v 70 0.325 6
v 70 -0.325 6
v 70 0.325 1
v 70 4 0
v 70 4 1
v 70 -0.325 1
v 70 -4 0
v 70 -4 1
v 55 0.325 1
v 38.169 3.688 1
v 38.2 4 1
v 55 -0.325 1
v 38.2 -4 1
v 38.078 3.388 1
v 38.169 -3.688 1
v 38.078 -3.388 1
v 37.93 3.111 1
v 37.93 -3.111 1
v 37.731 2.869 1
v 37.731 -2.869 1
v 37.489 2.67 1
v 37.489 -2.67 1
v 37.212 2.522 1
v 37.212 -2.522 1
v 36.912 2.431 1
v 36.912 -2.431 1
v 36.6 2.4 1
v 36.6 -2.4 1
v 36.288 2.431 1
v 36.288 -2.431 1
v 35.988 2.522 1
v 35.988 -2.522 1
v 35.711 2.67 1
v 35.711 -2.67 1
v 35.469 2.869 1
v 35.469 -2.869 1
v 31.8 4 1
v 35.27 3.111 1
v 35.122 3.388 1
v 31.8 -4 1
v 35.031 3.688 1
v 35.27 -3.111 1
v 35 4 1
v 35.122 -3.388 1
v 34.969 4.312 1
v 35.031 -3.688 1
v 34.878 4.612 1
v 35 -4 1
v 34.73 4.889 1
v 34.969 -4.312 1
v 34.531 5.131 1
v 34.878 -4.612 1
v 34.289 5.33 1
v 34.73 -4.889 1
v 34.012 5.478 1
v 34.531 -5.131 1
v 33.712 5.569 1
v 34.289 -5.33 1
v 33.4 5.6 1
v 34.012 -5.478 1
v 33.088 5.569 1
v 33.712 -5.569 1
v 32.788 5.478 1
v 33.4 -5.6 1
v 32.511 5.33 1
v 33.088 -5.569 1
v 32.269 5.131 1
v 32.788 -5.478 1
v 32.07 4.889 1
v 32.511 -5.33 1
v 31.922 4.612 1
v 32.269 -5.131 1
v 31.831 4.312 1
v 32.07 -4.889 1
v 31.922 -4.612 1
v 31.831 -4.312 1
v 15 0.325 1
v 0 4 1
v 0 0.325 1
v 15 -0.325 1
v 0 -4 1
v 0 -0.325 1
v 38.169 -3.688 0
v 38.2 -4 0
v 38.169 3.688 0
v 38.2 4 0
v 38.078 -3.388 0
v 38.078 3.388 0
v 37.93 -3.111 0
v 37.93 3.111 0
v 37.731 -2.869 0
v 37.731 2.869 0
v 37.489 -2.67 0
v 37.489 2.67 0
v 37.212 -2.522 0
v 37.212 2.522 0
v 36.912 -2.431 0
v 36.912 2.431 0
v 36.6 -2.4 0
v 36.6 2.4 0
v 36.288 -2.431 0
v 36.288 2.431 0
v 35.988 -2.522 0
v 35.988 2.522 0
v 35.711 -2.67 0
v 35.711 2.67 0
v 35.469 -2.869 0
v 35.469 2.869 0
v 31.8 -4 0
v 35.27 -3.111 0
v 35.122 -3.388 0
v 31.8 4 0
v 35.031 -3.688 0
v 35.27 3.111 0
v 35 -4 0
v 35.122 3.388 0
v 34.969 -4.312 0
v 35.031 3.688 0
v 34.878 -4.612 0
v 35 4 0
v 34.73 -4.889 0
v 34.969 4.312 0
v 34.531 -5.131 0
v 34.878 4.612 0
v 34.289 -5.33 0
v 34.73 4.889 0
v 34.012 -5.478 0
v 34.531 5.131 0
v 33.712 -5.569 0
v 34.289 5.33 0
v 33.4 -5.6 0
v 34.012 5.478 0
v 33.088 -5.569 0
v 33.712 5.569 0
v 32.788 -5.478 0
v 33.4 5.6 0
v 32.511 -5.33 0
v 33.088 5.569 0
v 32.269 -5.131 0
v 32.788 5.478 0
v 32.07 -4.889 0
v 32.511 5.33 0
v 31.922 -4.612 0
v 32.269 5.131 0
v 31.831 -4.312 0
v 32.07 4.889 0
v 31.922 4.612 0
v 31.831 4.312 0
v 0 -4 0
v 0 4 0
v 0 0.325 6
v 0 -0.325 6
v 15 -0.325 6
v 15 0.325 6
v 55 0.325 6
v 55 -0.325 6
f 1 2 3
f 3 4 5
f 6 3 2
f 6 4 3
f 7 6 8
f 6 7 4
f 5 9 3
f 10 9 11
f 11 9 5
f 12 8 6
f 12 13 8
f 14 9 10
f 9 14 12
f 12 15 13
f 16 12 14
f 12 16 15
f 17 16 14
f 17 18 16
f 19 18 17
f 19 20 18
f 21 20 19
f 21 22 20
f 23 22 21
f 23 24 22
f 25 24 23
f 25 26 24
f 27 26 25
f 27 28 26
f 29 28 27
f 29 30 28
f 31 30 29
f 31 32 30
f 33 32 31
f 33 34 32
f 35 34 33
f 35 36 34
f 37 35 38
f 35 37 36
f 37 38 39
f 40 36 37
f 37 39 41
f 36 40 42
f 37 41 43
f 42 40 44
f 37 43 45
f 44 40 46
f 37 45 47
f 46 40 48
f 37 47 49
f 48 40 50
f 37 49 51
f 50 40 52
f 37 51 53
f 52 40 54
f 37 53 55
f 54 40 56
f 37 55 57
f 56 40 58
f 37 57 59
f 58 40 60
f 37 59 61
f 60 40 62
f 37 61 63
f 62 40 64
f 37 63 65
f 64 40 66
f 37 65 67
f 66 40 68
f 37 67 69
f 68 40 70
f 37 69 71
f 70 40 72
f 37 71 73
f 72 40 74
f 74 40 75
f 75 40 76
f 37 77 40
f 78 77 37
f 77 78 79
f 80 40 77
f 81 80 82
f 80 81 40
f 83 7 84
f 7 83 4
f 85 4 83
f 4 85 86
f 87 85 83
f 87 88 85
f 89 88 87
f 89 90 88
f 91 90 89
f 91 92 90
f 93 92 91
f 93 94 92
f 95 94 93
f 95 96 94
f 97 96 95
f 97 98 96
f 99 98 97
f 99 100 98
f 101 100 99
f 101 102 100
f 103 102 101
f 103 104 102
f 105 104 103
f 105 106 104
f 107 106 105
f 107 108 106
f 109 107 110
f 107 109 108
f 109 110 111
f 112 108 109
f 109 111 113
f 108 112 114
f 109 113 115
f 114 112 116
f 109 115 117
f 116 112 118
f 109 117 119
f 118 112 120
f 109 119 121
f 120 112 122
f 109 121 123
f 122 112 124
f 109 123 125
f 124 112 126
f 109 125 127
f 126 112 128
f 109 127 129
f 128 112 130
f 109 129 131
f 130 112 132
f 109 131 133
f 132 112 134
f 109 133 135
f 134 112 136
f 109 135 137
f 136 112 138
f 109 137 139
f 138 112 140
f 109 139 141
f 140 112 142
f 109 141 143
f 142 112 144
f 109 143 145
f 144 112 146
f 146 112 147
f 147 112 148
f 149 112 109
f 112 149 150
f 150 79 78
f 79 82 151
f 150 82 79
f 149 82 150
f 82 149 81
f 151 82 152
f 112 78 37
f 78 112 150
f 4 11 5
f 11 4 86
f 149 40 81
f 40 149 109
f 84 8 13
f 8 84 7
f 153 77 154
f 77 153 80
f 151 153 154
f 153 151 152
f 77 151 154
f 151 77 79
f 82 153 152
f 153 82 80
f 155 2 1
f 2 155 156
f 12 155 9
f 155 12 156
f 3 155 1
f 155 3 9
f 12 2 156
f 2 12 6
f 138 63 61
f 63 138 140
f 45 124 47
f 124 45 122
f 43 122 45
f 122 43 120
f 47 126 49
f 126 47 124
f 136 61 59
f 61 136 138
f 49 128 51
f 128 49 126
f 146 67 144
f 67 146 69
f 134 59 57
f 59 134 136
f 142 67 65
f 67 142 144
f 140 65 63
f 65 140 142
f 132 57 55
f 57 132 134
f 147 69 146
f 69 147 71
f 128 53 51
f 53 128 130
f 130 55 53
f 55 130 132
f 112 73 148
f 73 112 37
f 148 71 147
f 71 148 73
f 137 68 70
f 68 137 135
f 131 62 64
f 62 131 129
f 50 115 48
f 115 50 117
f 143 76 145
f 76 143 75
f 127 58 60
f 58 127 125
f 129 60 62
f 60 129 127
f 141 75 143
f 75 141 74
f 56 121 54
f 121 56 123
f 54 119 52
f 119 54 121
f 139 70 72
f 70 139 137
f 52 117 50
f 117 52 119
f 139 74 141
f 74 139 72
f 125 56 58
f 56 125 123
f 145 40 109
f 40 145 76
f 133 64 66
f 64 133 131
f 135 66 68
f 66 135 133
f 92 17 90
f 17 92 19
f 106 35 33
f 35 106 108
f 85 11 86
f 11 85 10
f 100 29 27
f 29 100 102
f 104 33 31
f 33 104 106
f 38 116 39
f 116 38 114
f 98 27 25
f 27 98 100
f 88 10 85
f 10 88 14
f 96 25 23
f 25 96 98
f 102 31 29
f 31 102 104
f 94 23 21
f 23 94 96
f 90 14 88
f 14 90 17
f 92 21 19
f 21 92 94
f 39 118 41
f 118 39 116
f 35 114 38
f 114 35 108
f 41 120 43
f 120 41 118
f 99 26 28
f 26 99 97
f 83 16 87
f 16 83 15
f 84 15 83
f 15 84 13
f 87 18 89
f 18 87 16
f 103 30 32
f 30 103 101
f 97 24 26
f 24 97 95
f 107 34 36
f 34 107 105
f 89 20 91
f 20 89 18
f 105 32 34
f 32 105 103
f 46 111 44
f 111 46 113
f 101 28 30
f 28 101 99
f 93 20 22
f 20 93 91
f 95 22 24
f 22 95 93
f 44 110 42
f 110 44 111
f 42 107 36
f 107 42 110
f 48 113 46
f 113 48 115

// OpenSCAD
/*
Deterministic Retraction Calibration
Written by David Orgeman - 2015
Released under the Creative Commons Attribution-ShareAlike license
CC BY-SA

This creates a calibration object with a vertical fin that has a gap
of a specified size.  The object is designed so that most slicers will
cause retract to occur on one side of the gap, the printhead to then
travel directly to the other side of the gap, and reload to then occur.
This allows careful examination and tuning of the retraction parameters
to improve print quality.  Because the object is easy to print and does
not depend on other challenging capabilities, this allows tuning even
on a printer that is still a long ways from printing cleanly.  It is
adjustable if the default parameters do not work for some specific
printer.  The base of the object has on indent indicating the side of
the gap where retract took place, and a bump indicating the side where
reload happened.  Those markers can be flipped if the slicer in use
causes a different path from what I have generally seen.
*/



//PARAMETERS

//gap over which the retract will travel
WallGap=40;

//single extrusion width wall thickness
WallWidth=0.65;

//height of the calibration object
WallHeight=6;

//length of the wall on each side of the gap
WallLength=15;

//width of the calibration object
BaseWidth=8;

//print retract and reload normal(1) or inverted(-1)
Flipper=1;//[1,-1]



Retraction();



module Retraction() {
	difference() {
		union() {
			translate([0,-BaseWidth/2,0])
				cube([2*WallLength+WallGap,BaseWidth,1]);
			translate([0,-WallWidth/2,0])
				cube([WallLength,WallWidth,WallHeight]);
			translate([WallLength+WallGap,-WallWidth/2,0])	
				cube([WallLength,WallWidth,WallHeight]);
			translate([WallLength+WallGap/2-Flipper*0.4*BaseWidth/2,BaseWidth/2,0])
				cylinder(r=0.4*BaseWidth/2,h=1,$fn=32);
			translate([WallLength+WallGap/2-Flipper*0.4*BaseWidth/2,-BaseWidth/2,0])
				cylinder(r=0.4*BaseWidth/2,h=1,$fn=32);
		}
			translate([WallLength+WallGap/2+Flipper*0.4*BaseWidth/2,BaseWidth/2,-1])
				cylinder(r=0.4*BaseWidth/2,h=3,$fn=32);
			translate([WallLength+WallGap/2+Flipper*0.4*BaseWidth/2,-BaseWidth/2,-1])
				cylinder(r=0.4*BaseWidth/2,h=3,$fn=32);
	}
}
